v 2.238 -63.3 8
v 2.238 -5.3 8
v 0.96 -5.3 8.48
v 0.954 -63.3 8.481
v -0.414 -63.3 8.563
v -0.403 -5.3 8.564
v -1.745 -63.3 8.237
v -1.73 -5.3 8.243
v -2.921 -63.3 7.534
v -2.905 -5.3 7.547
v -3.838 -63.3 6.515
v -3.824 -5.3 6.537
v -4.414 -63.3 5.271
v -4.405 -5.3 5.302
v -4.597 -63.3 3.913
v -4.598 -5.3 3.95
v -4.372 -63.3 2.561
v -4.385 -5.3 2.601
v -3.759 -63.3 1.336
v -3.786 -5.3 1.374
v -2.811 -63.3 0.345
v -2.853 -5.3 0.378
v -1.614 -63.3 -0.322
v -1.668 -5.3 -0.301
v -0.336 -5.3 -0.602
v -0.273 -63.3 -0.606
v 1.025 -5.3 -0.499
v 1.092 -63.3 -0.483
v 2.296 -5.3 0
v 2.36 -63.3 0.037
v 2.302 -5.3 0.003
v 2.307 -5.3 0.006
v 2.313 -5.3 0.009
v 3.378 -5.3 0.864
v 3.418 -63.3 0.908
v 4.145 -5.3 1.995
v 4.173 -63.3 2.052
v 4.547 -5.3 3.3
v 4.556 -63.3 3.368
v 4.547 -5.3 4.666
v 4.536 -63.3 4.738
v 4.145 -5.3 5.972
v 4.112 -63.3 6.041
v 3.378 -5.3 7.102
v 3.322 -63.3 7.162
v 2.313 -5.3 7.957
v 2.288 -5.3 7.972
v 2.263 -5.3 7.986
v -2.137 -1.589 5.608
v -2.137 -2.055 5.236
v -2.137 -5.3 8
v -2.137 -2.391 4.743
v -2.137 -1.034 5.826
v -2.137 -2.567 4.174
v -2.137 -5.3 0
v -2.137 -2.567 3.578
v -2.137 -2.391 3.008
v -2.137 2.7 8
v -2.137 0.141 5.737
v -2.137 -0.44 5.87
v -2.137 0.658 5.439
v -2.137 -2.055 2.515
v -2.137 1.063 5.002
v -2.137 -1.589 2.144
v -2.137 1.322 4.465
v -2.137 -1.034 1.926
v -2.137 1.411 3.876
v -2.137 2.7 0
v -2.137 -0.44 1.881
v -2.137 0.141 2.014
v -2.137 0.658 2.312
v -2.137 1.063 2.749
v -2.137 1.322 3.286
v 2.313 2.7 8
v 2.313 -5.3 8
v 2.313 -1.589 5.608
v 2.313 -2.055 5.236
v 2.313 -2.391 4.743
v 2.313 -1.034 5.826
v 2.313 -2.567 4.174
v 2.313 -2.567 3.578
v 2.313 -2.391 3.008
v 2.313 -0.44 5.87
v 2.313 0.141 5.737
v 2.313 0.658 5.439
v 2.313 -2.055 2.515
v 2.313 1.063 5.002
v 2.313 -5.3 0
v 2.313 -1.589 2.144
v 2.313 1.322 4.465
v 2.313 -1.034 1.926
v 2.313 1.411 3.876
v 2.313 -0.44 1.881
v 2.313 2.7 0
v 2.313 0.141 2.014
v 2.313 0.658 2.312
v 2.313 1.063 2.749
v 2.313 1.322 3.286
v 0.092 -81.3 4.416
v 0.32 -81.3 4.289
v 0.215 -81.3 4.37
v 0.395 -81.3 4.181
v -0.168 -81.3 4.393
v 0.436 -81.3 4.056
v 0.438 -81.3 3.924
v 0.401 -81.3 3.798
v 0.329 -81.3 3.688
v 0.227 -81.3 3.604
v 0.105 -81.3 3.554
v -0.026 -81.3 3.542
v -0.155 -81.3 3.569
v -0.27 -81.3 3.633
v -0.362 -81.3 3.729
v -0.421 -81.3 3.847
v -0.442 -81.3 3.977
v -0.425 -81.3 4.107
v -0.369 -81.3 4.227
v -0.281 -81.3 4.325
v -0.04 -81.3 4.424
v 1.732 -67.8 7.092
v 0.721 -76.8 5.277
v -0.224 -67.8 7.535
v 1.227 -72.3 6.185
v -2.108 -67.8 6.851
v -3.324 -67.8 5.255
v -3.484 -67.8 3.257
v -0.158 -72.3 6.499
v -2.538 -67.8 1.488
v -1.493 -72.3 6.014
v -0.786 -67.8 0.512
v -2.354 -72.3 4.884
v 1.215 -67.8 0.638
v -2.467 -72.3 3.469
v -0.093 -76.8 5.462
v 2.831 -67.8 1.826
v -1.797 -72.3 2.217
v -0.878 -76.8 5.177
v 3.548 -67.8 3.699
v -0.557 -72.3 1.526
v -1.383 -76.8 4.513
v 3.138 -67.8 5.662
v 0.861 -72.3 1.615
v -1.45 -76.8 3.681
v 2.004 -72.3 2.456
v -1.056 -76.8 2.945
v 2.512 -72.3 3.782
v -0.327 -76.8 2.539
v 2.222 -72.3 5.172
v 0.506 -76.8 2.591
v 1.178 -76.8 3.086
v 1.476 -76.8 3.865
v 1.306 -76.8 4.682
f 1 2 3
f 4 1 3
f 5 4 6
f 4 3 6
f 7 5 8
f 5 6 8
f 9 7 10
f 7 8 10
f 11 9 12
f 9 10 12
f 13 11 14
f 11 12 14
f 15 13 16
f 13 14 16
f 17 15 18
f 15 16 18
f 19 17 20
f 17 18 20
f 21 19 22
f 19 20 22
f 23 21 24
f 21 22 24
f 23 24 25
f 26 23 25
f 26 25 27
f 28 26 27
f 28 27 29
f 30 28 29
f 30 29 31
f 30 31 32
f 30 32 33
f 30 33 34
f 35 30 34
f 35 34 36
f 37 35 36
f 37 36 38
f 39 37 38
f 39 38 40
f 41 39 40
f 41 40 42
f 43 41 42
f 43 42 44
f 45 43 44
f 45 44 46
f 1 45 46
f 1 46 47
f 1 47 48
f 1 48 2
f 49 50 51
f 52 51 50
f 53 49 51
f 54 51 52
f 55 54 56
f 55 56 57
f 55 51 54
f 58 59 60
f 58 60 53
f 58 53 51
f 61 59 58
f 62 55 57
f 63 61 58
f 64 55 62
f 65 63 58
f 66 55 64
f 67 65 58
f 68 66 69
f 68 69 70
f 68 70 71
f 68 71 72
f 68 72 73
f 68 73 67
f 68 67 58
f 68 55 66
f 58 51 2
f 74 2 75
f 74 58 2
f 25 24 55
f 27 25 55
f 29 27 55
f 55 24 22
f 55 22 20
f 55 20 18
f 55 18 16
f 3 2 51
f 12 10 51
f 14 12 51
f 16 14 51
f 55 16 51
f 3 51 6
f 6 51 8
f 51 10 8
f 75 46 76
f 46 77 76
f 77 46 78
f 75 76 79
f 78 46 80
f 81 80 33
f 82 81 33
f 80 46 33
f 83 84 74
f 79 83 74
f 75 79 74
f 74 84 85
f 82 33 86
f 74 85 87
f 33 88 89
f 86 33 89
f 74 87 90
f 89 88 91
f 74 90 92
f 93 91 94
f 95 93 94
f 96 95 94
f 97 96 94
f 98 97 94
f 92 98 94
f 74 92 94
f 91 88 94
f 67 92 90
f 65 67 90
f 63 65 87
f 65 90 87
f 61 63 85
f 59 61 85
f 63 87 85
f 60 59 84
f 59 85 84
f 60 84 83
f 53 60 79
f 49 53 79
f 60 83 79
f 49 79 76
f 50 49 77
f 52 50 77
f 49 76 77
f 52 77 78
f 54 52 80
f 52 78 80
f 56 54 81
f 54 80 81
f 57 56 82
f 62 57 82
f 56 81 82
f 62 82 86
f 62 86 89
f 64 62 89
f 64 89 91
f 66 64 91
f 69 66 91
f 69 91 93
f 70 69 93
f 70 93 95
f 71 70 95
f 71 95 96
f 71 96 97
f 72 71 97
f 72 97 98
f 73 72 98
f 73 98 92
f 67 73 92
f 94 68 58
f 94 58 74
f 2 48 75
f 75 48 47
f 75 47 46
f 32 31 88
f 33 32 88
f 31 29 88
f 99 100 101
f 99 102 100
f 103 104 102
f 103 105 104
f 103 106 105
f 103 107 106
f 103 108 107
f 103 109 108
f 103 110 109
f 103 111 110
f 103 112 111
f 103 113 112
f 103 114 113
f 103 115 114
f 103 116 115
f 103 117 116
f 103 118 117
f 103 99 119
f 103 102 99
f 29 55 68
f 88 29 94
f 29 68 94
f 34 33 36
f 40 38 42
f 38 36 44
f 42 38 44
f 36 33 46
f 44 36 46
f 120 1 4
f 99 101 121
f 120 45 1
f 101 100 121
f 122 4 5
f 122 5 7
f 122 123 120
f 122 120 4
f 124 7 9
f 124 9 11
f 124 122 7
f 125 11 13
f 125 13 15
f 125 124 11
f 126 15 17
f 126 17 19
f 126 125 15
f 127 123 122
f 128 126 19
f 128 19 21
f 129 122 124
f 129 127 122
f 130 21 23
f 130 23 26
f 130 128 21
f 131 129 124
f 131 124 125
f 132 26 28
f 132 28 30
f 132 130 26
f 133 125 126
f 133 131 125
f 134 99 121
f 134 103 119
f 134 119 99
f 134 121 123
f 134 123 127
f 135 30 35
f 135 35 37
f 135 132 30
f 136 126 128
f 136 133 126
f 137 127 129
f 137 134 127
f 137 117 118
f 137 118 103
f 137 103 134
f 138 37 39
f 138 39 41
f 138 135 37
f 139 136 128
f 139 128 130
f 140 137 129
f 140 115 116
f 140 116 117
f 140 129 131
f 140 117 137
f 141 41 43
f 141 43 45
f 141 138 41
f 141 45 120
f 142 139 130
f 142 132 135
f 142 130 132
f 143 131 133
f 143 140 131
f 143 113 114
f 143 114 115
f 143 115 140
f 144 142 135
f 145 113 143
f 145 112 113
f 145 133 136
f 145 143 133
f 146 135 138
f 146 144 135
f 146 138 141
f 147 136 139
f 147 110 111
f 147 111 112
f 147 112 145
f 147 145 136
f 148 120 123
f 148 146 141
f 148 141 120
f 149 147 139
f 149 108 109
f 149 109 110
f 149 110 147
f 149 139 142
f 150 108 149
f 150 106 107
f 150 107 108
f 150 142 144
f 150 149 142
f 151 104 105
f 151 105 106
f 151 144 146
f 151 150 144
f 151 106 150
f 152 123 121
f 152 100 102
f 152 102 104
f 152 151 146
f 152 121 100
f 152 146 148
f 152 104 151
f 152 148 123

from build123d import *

# Parameters (mm, degrees)
ESQUISSE1_W             = 4.45
ESQUISSE1_H             = 8
BOSS_EXTRU_1_DEPTH      = 8
ESQUISSE2_R             = 4.597869413
BOSS_EXTRU_2_DEPTH      = 58
ESQUISSE4_R             = 2
ENL_V_MAT_EXTRU_1_DEPTH = 18
ESQUISSE5_R             = 4.597869413
BOSS_EXTRU_3_DEPTH      = 18
BOSS_EXTRU_3_TAPER      = 13


with BuildPart() as part:
    # Esquisse1 → Boss.-Extru.1 (new body)
    with BuildSketch(Plane.XY):
        with Locations((0.087605016, -1.300333333)):
            Rectangle(ESQUISSE1_W, ESQUISSE1_H)
    extrude(amount=BOSS_EXTRU_1_DEPTH)

    # Esquisse2 → Boss.-Extru.2 (add)
    with BuildSketch(Plane.XZ.offset(5.300333333)):
        with Locations(Location((0, 3.983435039, 0), (0, 0, 60.876291729))):
            Circle(ESQUISSE2_R)
    extrude(amount=BOSS_EXTRU_2_DEPTH)

    # Esquisse4 → Enlèv. mat.-Extru.1 (cut)
    with BuildSketch(Plane(origin=(2.312605016, 0, 0), x_dir=(0, 0, -1), z_dir=(1, 0, 0))):
        with Locations(Location((-3.87570667, -0.589342017, 0), (0, 0, 90))):
            Circle(ESQUISSE4_R)
    extrude(amount=-ENL_V_MAT_EXTRU_1_DEPTH, mode=Mode.SUBTRACT)

    # Esquisse5 → Boss.-Extru.3 (add)
    with BuildSketch(Plane.XZ.offset(63.300333333)):
        with Locations(Location((0, 3.983435039, 0), (0, 0, 60.876291729))):
            Circle(ESQUISSE5_R)
    extrude(amount=BOSS_EXTRU_3_DEPTH, taper=BOSS_EXTRU_3_TAPER)


solid = part.part
